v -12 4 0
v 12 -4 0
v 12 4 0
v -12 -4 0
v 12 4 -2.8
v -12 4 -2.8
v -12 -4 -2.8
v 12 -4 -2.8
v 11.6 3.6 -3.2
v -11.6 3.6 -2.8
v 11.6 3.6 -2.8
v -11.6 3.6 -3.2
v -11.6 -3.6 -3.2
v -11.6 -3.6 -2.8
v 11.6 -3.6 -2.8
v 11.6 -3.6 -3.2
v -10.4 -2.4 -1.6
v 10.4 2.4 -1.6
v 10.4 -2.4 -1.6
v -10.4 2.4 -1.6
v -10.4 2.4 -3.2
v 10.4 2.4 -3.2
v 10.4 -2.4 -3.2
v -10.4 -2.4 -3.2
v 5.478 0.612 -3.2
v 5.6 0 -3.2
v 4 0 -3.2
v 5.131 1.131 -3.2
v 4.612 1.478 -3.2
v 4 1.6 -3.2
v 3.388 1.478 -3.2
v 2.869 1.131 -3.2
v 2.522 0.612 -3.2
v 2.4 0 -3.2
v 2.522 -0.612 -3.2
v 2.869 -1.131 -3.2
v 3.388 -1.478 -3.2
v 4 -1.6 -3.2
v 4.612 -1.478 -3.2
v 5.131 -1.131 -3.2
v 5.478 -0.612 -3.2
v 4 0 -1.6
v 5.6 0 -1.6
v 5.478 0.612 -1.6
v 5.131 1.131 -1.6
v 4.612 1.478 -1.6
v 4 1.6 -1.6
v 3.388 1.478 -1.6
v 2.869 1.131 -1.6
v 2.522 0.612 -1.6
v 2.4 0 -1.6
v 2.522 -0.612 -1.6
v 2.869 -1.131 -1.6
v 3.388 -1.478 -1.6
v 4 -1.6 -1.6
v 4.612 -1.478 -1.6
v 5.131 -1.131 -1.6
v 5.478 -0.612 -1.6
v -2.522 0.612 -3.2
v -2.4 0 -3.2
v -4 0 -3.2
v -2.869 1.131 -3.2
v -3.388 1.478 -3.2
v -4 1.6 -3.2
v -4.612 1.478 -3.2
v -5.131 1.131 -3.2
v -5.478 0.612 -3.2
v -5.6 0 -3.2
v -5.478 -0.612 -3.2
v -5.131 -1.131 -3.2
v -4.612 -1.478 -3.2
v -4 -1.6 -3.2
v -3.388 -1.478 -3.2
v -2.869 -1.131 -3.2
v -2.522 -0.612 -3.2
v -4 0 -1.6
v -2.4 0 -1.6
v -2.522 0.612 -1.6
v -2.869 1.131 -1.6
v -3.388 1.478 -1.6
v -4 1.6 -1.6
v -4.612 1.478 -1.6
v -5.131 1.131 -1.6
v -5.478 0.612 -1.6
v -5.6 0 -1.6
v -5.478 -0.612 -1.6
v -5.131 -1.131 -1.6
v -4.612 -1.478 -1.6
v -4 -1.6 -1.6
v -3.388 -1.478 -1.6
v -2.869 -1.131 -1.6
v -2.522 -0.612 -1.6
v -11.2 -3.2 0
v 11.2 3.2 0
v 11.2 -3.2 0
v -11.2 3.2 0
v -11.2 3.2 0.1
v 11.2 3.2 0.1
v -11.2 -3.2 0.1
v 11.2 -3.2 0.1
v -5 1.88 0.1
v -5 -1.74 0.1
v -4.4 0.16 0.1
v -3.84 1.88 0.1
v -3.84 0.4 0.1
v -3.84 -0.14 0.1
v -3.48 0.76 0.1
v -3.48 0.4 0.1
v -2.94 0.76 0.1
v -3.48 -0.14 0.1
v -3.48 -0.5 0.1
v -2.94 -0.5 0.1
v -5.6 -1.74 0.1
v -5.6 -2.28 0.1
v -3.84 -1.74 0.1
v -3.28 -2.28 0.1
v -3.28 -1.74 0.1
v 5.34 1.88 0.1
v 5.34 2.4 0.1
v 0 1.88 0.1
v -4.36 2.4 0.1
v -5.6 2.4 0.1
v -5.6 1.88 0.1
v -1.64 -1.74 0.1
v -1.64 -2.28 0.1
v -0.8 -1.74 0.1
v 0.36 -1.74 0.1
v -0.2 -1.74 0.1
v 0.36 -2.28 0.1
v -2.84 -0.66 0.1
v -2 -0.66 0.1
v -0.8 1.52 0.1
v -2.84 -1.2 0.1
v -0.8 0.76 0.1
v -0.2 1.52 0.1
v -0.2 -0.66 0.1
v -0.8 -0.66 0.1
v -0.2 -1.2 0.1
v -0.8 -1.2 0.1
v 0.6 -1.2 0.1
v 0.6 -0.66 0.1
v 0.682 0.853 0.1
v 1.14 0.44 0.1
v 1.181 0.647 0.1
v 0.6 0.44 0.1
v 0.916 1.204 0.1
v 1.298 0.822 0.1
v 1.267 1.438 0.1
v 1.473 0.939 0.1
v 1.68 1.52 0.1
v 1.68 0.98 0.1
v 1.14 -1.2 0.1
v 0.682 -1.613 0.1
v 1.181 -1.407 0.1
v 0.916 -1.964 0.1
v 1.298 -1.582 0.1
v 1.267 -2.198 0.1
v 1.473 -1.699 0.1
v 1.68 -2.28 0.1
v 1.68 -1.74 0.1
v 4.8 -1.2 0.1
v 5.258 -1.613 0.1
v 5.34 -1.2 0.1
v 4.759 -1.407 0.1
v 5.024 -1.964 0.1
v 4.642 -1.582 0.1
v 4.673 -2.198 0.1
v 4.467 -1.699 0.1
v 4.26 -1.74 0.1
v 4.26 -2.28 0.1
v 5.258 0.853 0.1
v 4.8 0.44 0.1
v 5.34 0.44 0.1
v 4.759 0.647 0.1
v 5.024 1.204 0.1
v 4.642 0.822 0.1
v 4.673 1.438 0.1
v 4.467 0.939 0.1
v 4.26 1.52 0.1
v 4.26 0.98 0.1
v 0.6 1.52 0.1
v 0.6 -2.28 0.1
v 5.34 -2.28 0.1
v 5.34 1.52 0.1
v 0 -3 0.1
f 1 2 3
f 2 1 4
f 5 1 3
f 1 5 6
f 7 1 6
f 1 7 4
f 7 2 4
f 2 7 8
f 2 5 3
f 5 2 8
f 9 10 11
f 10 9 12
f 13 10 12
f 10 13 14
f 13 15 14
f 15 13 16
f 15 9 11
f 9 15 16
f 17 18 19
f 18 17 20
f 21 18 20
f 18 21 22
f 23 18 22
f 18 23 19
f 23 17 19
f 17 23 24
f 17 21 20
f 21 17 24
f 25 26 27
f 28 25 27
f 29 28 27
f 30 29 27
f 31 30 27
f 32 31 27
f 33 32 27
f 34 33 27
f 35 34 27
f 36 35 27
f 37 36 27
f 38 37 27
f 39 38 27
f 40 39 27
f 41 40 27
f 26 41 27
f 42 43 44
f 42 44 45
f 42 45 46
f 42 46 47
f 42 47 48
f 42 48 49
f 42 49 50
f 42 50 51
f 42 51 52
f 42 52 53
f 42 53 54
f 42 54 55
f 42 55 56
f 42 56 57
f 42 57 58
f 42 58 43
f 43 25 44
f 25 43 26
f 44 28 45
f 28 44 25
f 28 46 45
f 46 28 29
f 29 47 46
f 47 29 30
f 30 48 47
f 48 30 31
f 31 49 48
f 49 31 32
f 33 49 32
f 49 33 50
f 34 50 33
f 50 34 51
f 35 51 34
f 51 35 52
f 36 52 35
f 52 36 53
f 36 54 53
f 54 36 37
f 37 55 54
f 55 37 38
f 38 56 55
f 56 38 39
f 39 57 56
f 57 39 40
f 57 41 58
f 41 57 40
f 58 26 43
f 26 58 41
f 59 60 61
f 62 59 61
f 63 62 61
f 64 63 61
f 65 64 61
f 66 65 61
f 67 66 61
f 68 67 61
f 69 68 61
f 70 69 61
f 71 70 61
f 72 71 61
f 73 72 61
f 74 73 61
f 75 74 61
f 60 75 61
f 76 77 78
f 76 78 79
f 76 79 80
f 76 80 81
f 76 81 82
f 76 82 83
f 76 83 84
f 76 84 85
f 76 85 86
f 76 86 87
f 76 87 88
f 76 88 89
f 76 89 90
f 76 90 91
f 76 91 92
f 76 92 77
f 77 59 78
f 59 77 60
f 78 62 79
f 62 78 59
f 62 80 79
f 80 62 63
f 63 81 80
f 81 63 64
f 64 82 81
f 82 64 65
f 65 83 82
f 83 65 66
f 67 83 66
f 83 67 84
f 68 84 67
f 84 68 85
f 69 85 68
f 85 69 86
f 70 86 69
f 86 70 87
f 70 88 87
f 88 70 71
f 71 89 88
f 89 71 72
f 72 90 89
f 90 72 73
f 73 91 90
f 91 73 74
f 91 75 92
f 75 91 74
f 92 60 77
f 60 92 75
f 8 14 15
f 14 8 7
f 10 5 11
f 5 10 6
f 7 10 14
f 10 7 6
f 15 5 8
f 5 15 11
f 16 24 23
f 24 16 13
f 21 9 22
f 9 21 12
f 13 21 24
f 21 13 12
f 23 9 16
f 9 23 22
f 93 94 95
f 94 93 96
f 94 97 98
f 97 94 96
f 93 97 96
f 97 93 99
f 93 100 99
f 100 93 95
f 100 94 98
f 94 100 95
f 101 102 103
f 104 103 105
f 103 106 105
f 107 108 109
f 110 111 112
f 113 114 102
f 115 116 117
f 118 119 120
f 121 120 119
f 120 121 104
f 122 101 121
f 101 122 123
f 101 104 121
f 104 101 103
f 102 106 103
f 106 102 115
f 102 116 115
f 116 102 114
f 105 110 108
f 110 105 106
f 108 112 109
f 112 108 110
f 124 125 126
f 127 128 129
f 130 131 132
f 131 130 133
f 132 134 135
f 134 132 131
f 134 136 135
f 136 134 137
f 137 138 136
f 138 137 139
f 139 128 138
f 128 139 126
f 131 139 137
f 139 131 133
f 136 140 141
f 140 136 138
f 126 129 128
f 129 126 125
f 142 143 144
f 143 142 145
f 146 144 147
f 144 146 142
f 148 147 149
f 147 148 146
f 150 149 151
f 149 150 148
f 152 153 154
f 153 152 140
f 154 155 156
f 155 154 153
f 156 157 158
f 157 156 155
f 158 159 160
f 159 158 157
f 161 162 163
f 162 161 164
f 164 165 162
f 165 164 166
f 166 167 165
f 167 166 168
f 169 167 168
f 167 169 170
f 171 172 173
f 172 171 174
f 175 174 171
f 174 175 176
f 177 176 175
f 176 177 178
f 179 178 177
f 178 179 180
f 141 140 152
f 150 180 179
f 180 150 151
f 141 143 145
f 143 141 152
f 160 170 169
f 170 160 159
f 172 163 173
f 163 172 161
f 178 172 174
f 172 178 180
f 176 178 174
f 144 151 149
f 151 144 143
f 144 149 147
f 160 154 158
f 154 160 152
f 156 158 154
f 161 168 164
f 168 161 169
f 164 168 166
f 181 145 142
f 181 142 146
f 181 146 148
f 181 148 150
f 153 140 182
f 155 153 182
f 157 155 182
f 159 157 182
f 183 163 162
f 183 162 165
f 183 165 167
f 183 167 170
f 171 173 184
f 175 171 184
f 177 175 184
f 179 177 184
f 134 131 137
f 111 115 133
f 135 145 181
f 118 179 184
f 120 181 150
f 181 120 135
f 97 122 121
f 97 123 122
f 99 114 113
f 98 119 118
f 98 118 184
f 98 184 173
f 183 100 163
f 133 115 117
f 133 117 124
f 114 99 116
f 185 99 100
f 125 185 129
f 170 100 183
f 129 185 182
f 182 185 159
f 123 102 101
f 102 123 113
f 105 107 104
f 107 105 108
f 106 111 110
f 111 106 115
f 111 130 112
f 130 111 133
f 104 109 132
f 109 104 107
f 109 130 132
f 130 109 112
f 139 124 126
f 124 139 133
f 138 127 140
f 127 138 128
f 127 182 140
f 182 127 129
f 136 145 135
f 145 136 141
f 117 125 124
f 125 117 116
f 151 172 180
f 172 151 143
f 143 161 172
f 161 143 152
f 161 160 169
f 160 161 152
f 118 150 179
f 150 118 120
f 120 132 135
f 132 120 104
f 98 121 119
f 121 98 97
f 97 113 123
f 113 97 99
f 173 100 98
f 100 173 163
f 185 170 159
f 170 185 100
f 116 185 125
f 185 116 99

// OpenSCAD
// file: ../p/4-4edge.scad
use <../lib.scad>
function ldraw_lib__4_4edge() = [
// 0 Circle 1.0
// 0 Name: 4-4edge.dat
// 0 Author: James Jessiman
// 0 !LDRAW_ORG Primitive UPDATE 2017-01
// 0 !LICENSE Licensed under CC BY 2.0 and CC BY 4.0 : see CAreadme.txt
// 
// 0 BFC CERTIFY CCW
  [0,"BFC","CERTIFY"],
  [0,"BFC","CCW"],
// 
// 0 !HISTORY 1998-12-15 [PTadmin] Official Update 1998-10
// 0 !HISTORY 2005-12-28 [PTadmin] Official Update 2005-01
// 0 !HISTORY 2007-06-24 [PTadmin] Header formatted for Contributor Agreement
// 0 !HISTORY 2008-07-01 [PTadmin] Official Update 2008-01
// 0 !HISTORY 2017-01-15 [Steffen] BFCed
// 0 !HISTORY 2017-12-30 [PTadmin] Official Update 2017-01
// 
// 
// 2 24 1 0 0 0.9239 0 0.3827
  [2,24,1,0,0,0.9239,0,0.3827],
// 2 24 0.9239 0 0.3827 0.7071 0 0.7071
  [2,24,0.9239,0,0.3827,0.7071,0,0.7071],
// 2 24 0.7071 0 0.7071 0.3827 0 0.9239
  [2,24,0.7071,0,0.7071,0.3827,0,0.9239],
// 2 24 0.3827 0 0.9239 0 0 1
  [2,24,0.3827,0,0.9239,0,0,1],
// 2 24 0 0 1 -0.3827 0 0.9239
  [2,24,0,0,1,-0.3827,0,0.9239],
// 2 24 -0.3827 0 0.9239 -0.7071 0 0.7071
  [2,24,-0.3827,0,0.9239,-0.7071,0,0.7071],
// 2 24 -0.7071 0 0.7071 -0.9239 0 0.3827
  [2,24,-0.7071,0,0.7071,-0.9239,0,0.3827],
// 2 24 -0.9239 0 0.3827 -1 0 -0
  [2,24,-0.9239,0,0.3827,-1,0,-0],
// 2 24 -1 0 -0 -0.9239 0 -0.3827
  [2,24,-1,0,-0,-0.9239,0,-0.3827],
// 2 24 -0.9239 0 -0.3827 -0.7071 0 -0.7071
  [2,24,-0.9239,0,-0.3827,-0.7071,0,-0.7071],
// 2 24 -0.7071 0 -0.7071 -0.3827 0 -0.9239
  [2,24,-0.7071,0,-0.7071,-0.3827,0,-0.9239],
// 2 24 -0.3827 0 -0.9239 0 0 -1
  [2,24,-0.3827,0,-0.9239,0,0,-1],
// 2 24 0 0 -1 0.3827 0 -0.9239
  [2,24,0,0,-1,0.3827,0,-0.9239],
// 2 24 0.3827 0 -0.9239 0.7071 0 -0.7071
  [2,24,0.3827,0,-0.9239,0.7071,0,-0.7071],
// 2 24 0.7071 0 -0.7071 0.9239 0 -0.3827
  [2,24,0.7071,0,-0.7071,0.9239,0,-0.3827],
// 2 24 0.9239 0 -0.3827 1 0 0
  [2,24,0.9239,0,-0.3827,1,0,0],
];
module ldraw_lib__4_4edge(step=0, col=false, unit=2/5, alt=false, line=0.2, solid=!$preview)
    makepoly(ldraw_lib__4_4edge(), step=step, col=col, unit=unit, alt=alt, line=line, solid=solid);
ldraw_lib__4_4edge(line=0.2);
// file: ../p/4-4disc.scad
use <../lib.scad>
function ldraw_lib__4_4disc() = [
// 0 Disc 1.0
// 0 Name: 4-4disc.dat
// 0 Author: James Jessiman
// 0 !LDRAW_ORG Primitive UPDATE 2002-02
// 0 !LICENSE Licensed under CC BY 2.0 and CC BY 4.0 : see CAreadme.txt
// 
// 0 BFC CERTIFY CCW
  [0,"BFC","CERTIFY"],
  [0,"BFC","CCW"],
// 
// 0 !HISTORY 1998-12-15 [PTadmin] Official Update 1998-10
// 0 !HISTORY 2002-03-23 [sbliss] Added BFC statement
// 0 !HISTORY 2002-04-25 [PTadmin] Official Update 2002-02
// 0 !HISTORY 2007-06-24 [PTadmin] Header formatted for Contributor Agreement
// 0 !HISTORY 2008-07-01 [PTadmin] Official Update 2008-01
// 
// 
// 3 16 0 0 0 1 0 0 0.9239 0 0.3827
  [3,16,0,0,0,1,0,0,0.9239,0,0.3827],
// 3 16 0 0 0 0.9239 0 0.3827 0.7071 0 0.7071
  [3,16,0,0,0,0.9239,0,0.3827,0.7071,0,0.7071],
// 3 16 0 0 0 0.7071 0 0.7071 0.3827 0 0.9239
  [3,16,0,0,0,0.7071,0,0.7071,0.3827,0,0.9239],
// 3 16 0 0 0 0.3827 0 0.9239 0 0 1
  [3,16,0,0,0,0.3827,0,0.9239,0,0,1],
// 3 16 0 0 0 0 0 1 -0.3827 0 0.9239
  [3,16,0,0,0,0,0,1,-0.3827,0,0.9239],
// 3 16 0 0 0 -0.3827 0 0.9239 -0.7071 0 0.7071
  [3,16,0,0,0,-0.3827,0,0.9239,-0.7071,0,0.7071],
// 3 16 0 0 0 -0.7071 0 0.7071 -0.9239 0 0.3827
  [3,16,0,0,0,-0.7071,0,0.7071,-0.9239,0,0.3827],
// 3 16 0 0 0 -0.9239 0 0.3827 -1 0 -0
  [3,16,0,0,0,-0.9239,0,0.3827,-1,0,-0],
// 3 16 0 0 0 -1 0 -0 -0.9239 0 -0.3827
  [3,16,0,0,0,-1,0,-0,-0.9239,0,-0.3827],
// 3 16 0 0 0 -0.9239 0 -0.3827 -0.7071 0 -0.7071
  [3,16,0,0,0,-0.9239,0,-0.3827,-0.7071,0,-0.7071],
// 3 16 0 0 0 -0.7071 0 -0.7071 -0.3827 0 -0.9239
  [3,16,0,0,0,-0.7071,0,-0.7071,-0.3827,0,-0.9239],
// 3 16 0 0 0 -0.3827 0 -0.9239 0 0 -1
  [3,16,0,0,0,-0.3827,0,-0.9239,0,0,-1],
// 3 16 0 0 0 0 0 -1 0.3827 0 -0.9239
  [3,16,0,0,0,0,0,-1,0.3827,0,-0.9239],
// 3 16 0 0 0 0.3827 0 -0.9239 0.7071 0 -0.7071
  [3,16,0,0,0,0.3827,0,-0.9239,0.7071,0,-0.7071],
// 3 16 0 0 0 0.7071 0 -0.7071 0.9239 0 -0.3827
  [3,16,0,0,0,0.7071,0,-0.7071,0.9239,0,-0.3827],
// 3 16 0 0 0 0.9239 0 -0.3827 1 0 0
  [3,16,0,0,0,0.9239,0,-0.3827,1,0,0],
// 0
];
module ldraw_lib__4_4disc(step=0, col=false, unit=2/5, alt=false, line=0.2, solid=!$preview)
    makepoly(ldraw_lib__4_4disc(), step=step, col=col, unit=unit, alt=alt, line=line, solid=solid);
ldraw_lib__4_4disc(line=0.2);
// file: ../p/4-4cyli.scad
use <../lib.scad>
$fa=1; $fs=0.2;
function ldraw_lib__4_4cyli(realsolid=false) = [
// 0 Cylinder 1.0
// 0 Name: 4-4cyli.dat
// 0 Author: James Jessiman
// 0 !LDRAW_ORG Primitive UPDATE 2005-01
// 0 !LICENSE Licensed under CC BY 2.0 and CC BY 4.0 : see CAreadme.txt
// 
// 0 BFC CERTIFY CCW
  [0,"BFC","CERTIFY"],
  [0,"BFC","CCW"],
// 
// 0 !HISTORY 1998-12-15 [PTadmin] Official Update 1998-10
// 0 !HISTORY 2002-03-23 [sbliss] Added BFC statement; merged headers from files in distributions LDraw 0.27 and Complete.
// 0 !HISTORY 2002-04-25 [PTadmin] Official Update 2002-02
// 0 !HISTORY 2004-12-14 [guyvivan] BFC CCW
// 0 !HISTORY 2005-12-28 [PTadmin] Official Update 2005-01
// 0 !HISTORY 2007-06-24 [PTadmin] Header formatted for Contributor Agreement
// 0 !HISTORY 2008-07-01 [PTadmin] Official Update 2008-01
// 
// 
// 4 16 1 1 0 0.9239 1 0.3827 0.9239 0 0.3827 1 0 0
  [4,16,1,1,0,0.9239,1,0.3827,0.9239,0,0.3827,1,0,0],
// 5 24 1 0 0 1 1 0 0.9239 0 0.3827 0.9239 0 -0.3827
  [5,24,1,0,0,1,1,0,0.9239,0,0.3827,0.9239,0,-0.3827],
// 4 16 0.9239 1 0.3827 0.7071 1 0.7071 0.7071 0 0.7071 0.9239 0 0.3827
  [4,16,0.9239,1,0.3827,0.7071,1,0.7071,0.7071,0,0.7071,0.9239,0,0.3827],
// 5 24 0.9239 0 0.3827 0.9239 1 0.3827 0.7071 0 0.7071 1 0 0
  [5,24,0.9239,0,0.3827,0.9239,1,0.3827,0.7071,0,0.7071,1,0,0],
// 4 16 0.7071 1 0.7071 0.3827 1 0.9239 0.3827 0 0.9239 0.7071 0 0.7071
  [4,16,0.7071,1,0.7071,0.3827,1,0.9239,0.3827,0,0.9239,0.7071,0,0.7071],
// 5 24 0.7071 0 0.7071 0.7071 1 0.7071 0.3827 0 0.9239 0.9239 0 0.3827
  [5,24,0.7071,0,0.7071,0.7071,1,0.7071,0.3827,0,0.9239,0.9239,0,0.3827],
// 4 16 0.3827 1 0.9239 0 1 1 0 0 1 0.3827 0 0.9239
  [4,16,0.3827,1,0.9239,0,1,1,0,0,1,0.3827,0,0.9239],
// 5 24 0.3827 0 0.9239 0.3827 1 0.9239 0 0 1 0.7071 0 0.7071
  [5,24,0.3827,0,0.9239,0.3827,1,0.9239,0,0,1,0.7071,0,0.7071],
// 4 16 0 1 1 -0.3827 1 0.9239 -0.3827 0 0.9239 0 0 1
  [4,16,0,1,1,-0.3827,1,0.9239,-0.3827,0,0.9239,0,0,1],
// 5 24 0 0 1 0 1 1 -0.3827 0 0.9239 0.3827 0 0.9239
  [5,24,0,0,1,0,1,1,-0.3827,0,0.9239,0.3827,0,0.9239],
// 4 16 -0.3827 1 0.9239 -0.7071 1 0.7071 -0.7071 0 0.7071 -0.3827 0 0.9239
  [4,16,-0.3827,1,0.9239,-0.7071,1,0.7071,-0.7071,0,0.7071,-0.3827,0,0.9239],
// 5 24 -0.3827 0 0.9239 -0.3827 1 0.9239 -0.7071 0 0.7071 0 0 1
  [5,24,-0.3827,0,0.9239,-0.3827,1,0.9239,-0.7071,0,0.7071,0,0,1],
// 4 16 -0.7071 1 0.7071 -0.9239 1 0.3827 -0.9239 0 0.3827 -0.7071 0 0.7071
  [4,16,-0.7071,1,0.7071,-0.9239,1,0.3827,-0.9239,0,0.3827,-0.7071,0,0.7071],
// 5 24 -0.7071 0 0.7071 -0.7071 1 0.7071 -0.9239 0 0.3827 -0.3827 0 0.9239
  [5,24,-0.7071,0,0.7071,-0.7071,1,0.7071,-0.9239,0,0.3827,-0.3827,0,0.9239],
// 4 16 -0.9239 1 0.3827 -1 1 0 -1 0 0 -0.9239 0 0.3827
  [4,16,-0.9239,1,0.3827,-1,1,0,-1,0,0,-0.9239,0,0.3827],
// 5 24 -0.9239 0 0.3827 -0.9239 1 0.3827 -1 0 0 -0.7071 0 0.7071
  [5,24,-0.9239,0,0.3827,-0.9239,1,0.3827,-1,0,0,-0.7071,0,0.7071],
// 4 16 -1 1 0 -0.9239 1 -0.3827 -0.9239 0 -0.3827 -1 0 0
  [4,16,-1,1,0,-0.9239,1,-0.3827,-0.9239,0,-0.3827,-1,0,0],
// 5 24 -1 0 0 -1 1 0 -0.9239 0 -0.3827 -0.9239 0 0.3827
  [5,24,-1,0,0,-1,1,0,-0.9239,0,-0.3827,-0.9239,0,0.3827],
// 4 16 -0.9239 1 -0.3827 -0.7071 1 -0.7071 -0.7071 0 -0.7071 -0.9239 0 -0.3827
  [4,16,-0.9239,1,-0.3827,-0.7071,1,-0.7071,-0.7071,0,-0.7071,-0.9239,0,-0.3827],
// 5 24 -0.9239 0 -0.3827 -0.9239 1 -0.3827 -0.7071 0 -0.7071 -1 0 0
  [5,24,-0.9239,0,-0.3827,-0.9239,1,-0.3827,-0.7071,0,-0.7071,-1,0,0],
// 4 16 -0.7071 1 -0.7071 -0.3827 1 -0.9239 -0.3827 0 -0.9239 -0.7071 0 -0.7071
  [4,16,-0.7071,1,-0.7071,-0.3827,1,-0.9239,-0.3827,0,-0.9239,-0.7071,0,-0.7071],
// 5 24 -0.7071 0 -0.7071 -0.7071 1 -0.7071 -0.3827 0 -0.9239 -0.9239 0 -0.3827
  [5,24,-0.7071,0,-0.7071,-0.7071,1,-0.7071,-0.3827,0,-0.9239,-0.9239,0,-0.3827],
// 4 16 -0.3827 1 -0.9239 0 1 -1 0 0 -1 -0.3827 0 -0.9239
  [4,16,-0.3827,1,-0.9239,0,1,-1,0,0,-1,-0.3827,0,-0.9239],
// 5 24 -0.3827 0 -0.9239 -0.3827 1 -0.9239 0 0 -1 -0.7071 0 -0.7071
  [5,24,-0.3827,0,-0.9239,-0.3827,1,-0.9239,0,0,-1,-0.7071,0,-0.7071],
// 4 16 0 1 -1 0.3827 1 -0.9239 0.3827 0 -0.9239 0 0 -1
  [4,16,0,1,-1,0.3827,1,-0.9239,0.3827,0,-0.9239,0,0,-1],
// 5 24 0 0 -1 0 1 -1 0.3827 0 -0.9239 -0.3827 0 -0.9239
  [5,24,0,0,-1,0,1,-1,0.3827,0,-0.9239,-0.3827,0,-0.9239],
// 4 16 0.3827 1 -0.9239 0.7071 1 -0.7071 0.7071 0 -0.7071 0.3827 0 -0.9239
  [4,16,0.3827,1,-0.9239,0.7071,1,-0.7071,0.7071,0,-0.7071,0.3827,0,-0.9239],
// 5 24 0.3827 0 -0.9239 0.3827 1 -0.9239 0.7071 0 -0.7071 0 0 -1
  [5,24,0.3827,0,-0.9239,0.3827,1,-0.9239,0.7071,0,-0.7071,0,0,-1],
// 4 16 0.7071 1 -0.7071 0.9239 1 -0.3827 0.9239 0 -0.3827 0.7071 0 -0.7071
  [4,16,0.7071,1,-0.7071,0.9239,1,-0.3827,0.9239,0,-0.3827,0.7071,0,-0.7071],
// 5 24 0.7071 0 -0.7071 0.7071 1 -0.7071 0.9239 0 -0.3827 0.3827 0 -0.9239
  [5,24,0.7071,0,-0.7071,0.7071,1,-0.7071,0.9239,0,-0.3827,0.3827,0,-0.9239],
// 4 16 0.9239 1 -0.3827 1 1 0 1 0 0 0.9239 0 -0.3827
  [4,16,0.9239,1,-0.3827,1,1,0,1,0,0,0.9239,0,-0.3827],
// 5 24 0.9239 0 -0.3827 0.9239 1 -0.3827 1 0 0 0.7071 0 -0.7071
  [5,24,0.9239,0,-0.3827,0.9239,1,-0.3827,1,0,0,0.7071,0,-0.7071],
// 0
];
module ldraw_lib__4_4cyli(step=0, col=false, unit=2/5, alt=false, line=0.2, solid=!$preview)
    makepoly(ldraw_lib__4_4cyli(solid), step=step, col=col, unit=unit, alt=alt, line=line, solid=solid);
ldraw_lib__4_4cyli(line=0.2);
// file: ../p/stud3.scad
use <../lib.scad>
use <4-4cyli.scad>
use <4-4disc.scad>
use <4-4edge.scad>
function ldraw_lib__stud3() = [
// 0 Stud Tube Solid
// 0 Name: stud3.dat
// 0 Author: James Jessiman
// 0 !LDRAW_ORG Primitive UPDATE 2012-01
// 0 !LICENSE Licensed under CC BY 4.0 : see CAreadme.txt
// 
// 0 BFC CERTIFY CCW
  [0,"BFC","CERTIFY"],
  [0,"BFC","CCW"],
// 
// 0 !HISTORY 2002-04-04 [sbliss] Modified for BFC compliance
// 0 !HISTORY 2002-04-25 [PTadmin] Official Update 2002-02
// 0 !HISTORY 2007-06-24 [PTadmin] Header formatted for Contributor Agreement
// 0 !HISTORY 2008-07-01 [PTadmin] Official Update 2008-01
// 0 !HISTORY 2012-02-16 [Philo] Changed to CCW
// 0 !HISTORY 2012-03-30 [PTadmin] Official Update 2012-01
// 
// 
// 1 16 0 -4 0 4 0 0 0 1 0 0 0 4 4-4edge.dat
  [1,16,0,-4,0,4,0,0,0,1,0,0,0,4, ldraw_lib__4_4edge()],
// 1 16 0 0 0 4 0 0 0 1 0 0 0 4 4-4edge.dat
  [1,16,0,0,0,4,0,0,0,1,0,0,0,4, ldraw_lib__4_4edge()],
// 1 16 0 -4 0 4 0 0 0 1 0 0 0 4 4-4disc.dat
  [1,16,0,-4,0,4,0,0,0,1,0,0,0,4, ldraw_lib__4_4disc()],
  [-1,16,0,0,0,4,0,0,0,-1,0,0,0,4, ldraw_lib__4_4disc()],
// 1 16 0 -4 0 4 0 0 0 4 0 0 0 4 4-4cyli.dat
  [1,16,0,-4,0,4,0,0,0,4,0,0,0,4, ldraw_lib__4_4cyli()],
];
module ldraw_lib__stud3(step=0, col=false, unit=2/5, alt=false, line=0.2, solid=!$preview)
    makepoly(ldraw_lib__stud3(), step=step, col=col, unit=unit, alt=alt, line=line, solid=solid);
ldraw_lib__stud3(line=0.2);
// file: ../p/box5.scad
use <../lib.scad>
function ldraw_lib__box5() = [
// 0 Box with 5 Faces and All Edges
// 0 Name: box5.dat
// 0 Author: James Jessiman
// 0 !LDRAW_ORG Primitive UPDATE 2012-01
// 0 !LICENSE Licensed under CC BY 2.0 and CC BY 4.0 : see CAreadme.txt
// 
// 0 BFC CERTIFY CCW
  [0,"BFC","CERTIFY"],
  [0,"BFC","CCW"],
// 
// 0 !HISTORY 2002-04-03 [sbliss] Modified for BFC compliance
// 0 !HISTORY 2002-04-25 [PTadmin] Official Update 2002-02
// 0 !HISTORY 2007-06-24 [PTadmin] Header formatted for Contributor Agreement
// 0 !HISTORY 2008-07-01 [PTadmin] Official Update 2008-01
// 0 !HISTORY 2012-02-16 [Philo] Changed to CCW
// 0 !HISTORY 2012-03-30 [PTadmin] Official Update 2012-01
// 
// 
// 2 24 1 1 1 -1 1 1
  [2,24,1,1,1,-1,1,1],
// 2 24 -1 1 1 -1 1 -1
  [2,24,-1,1,1,-1,1,-1],
// 2 24 -1 1 -1 1 1 -1
  [2,24,-1,1,-1,1,1,-1],
// 2 24 1 1 -1 1 1 1
  [2,24,1,1,-1,1,1,1],
// 2 24 1 0 1 -1 0 1
  [2,24,1,0,1,-1,0,1],
// 2 24 -1 0 1 -1 0 -1
  [2,24,-1,0,1,-1,0,-1],
// 2 24 -1 0 -1 1 0 -1
  [2,24,-1,0,-1,1,0,-1],
// 2 24 1 0 -1 1 0 1
  [2,24,1,0,-1,1,0,1],
// 2 24 1 0 1 1 1 1
  [2,24,1,0,1,1,1,1],
// 2 24 -1 0 1 -1 1 1
  [2,24,-1,0,1,-1,1,1],
// 2 24 1 0 -1 1 1 -1
  [2,24,1,0,-1,1,1,-1],
// 2 24 -1 0 -1 -1 1 -1
  [2,24,-1,0,-1,-1,1,-1],
// 4 16 -1 1 1 1 1 1 1 1 -1 -1 1 -1
  [4,16,-1,1,1,1,1,1,1,1,-1,-1,1,-1],
// 4 16 -1 1 1 -1 0 1 1 0 1 1 1 1
  [4,16,-1,1,1,-1,0,1,1,0,1,1,1,1],
// 4 16 -1 1 -1 -1 0 -1 -1 0 1 -1 1 1
  [4,16,-1,1,-1,-1,0,-1,-1,0,1,-1,1,1],
// 4 16 1 1 -1 1 0 -1 -1 0 -1 -1 1 -1
  [4,16,1,1,-1,1,0,-1,-1,0,-1,-1,1,-1],
// 4 16 1 1 1 1 0 1 1 0 -1 1 1 -1
  [4,16,1,1,1,1,0,1,1,0,-1,1,1,-1],
];
makepoly(ldraw_lib__box5(), line=0.2);
// file: ../p/box4.scad
use <../lib.scad>
function ldraw_lib__box4() = [
// 0 Box with 4 Faces (2 Parallel Pairs) and All Edges
// 0 Name: box4.dat
// 0 Author: James Jessiman
// 0 !LDRAW_ORG Primitive UPDATE 2012-01
// 0 !LICENSE Licensed under CC BY 4.0 : see CAreadme.txt
// 
// 0 BFC CERTIFY CCW
  [0,"BFC","CERTIFY"],
  [0,"BFC","CCW"],
// 
// 0 !HISTORY 2002-04-03 [sbliss] Modified for BFC compliance
// 0 !HISTORY 2002-04-25 [PTadmin] Official Update 2002-02
// 0 !HISTORY 2007-06-24 [PTadmin] Header formatted for Contributor Agreement
// 0 !HISTORY 2008-07-01 [PTadmin] Official Update 2008-01
// 0 !HISTORY 2012-02-16 [Philo] Changed to CCW
// 0 !HISTORY 2012-03-30 [PTadmin] Official Update 2012-01
// 
// 
// 2 24 1 1 1 -1 1 1
  [2,24,1,1,1,-1,1,1],
// 2 24 -1 1 1 -1 1 -1
  [2,24,-1,1,1,-1,1,-1],
// 2 24 -1 1 -1 1 1 -1
  [2,24,-1,1,-1,1,1,-1],
// 2 24 1 1 -1 1 1 1
  [2,24,1,1,-1,1,1,1],
// 2 24 1 0 1 -1 0 1
  [2,24,1,0,1,-1,0,1],
// 2 24 -1 0 1 -1 0 -1
  [2,24,-1,0,1,-1,0,-1],
// 2 24 -1 0 -1 1 0 -1
  [2,24,-1,0,-1,1,0,-1],
// 2 24 1 0 -1 1 0 1
  [2,24,1,0,-1,1,0,1],
// 2 24 1 0 1 1 1 1
  [2,24,1,0,1,1,1,1],
// 2 24 -1 0 1 -1 1 1
  [2,24,-1,0,1,-1,1,1],
// 2 24 1 0 -1 1 1 -1
  [2,24,1,0,-1,1,1,-1],
// 2 24 -1 0 -1 -1 1 -1
  [2,24,-1,0,-1,-1,1,-1],
// 4 16 -1 1 1 -1 0 1 1 0 1 1 1 1
  [4,16,-1,1,1,-1,0,1,1,0,1,1,1,1],
// 4 16 -1 1 -1 -1 0 -1 -1 0 1 -1 1 1
  [4,16,-1,1,-1,-1,0,-1,-1,0,1,-1,1,1],
// 4 16 1 1 -1 1 0 -1 -1 0 -1 -1 1 -1
  [4,16,1,1,-1,1,0,-1,-1,0,-1,-1,1,-1],
// 4 16 1 1 1 1 0 1 1 0 -1 1 1 -1
  [4,16,1,1,1,1,0,1,1,0,-1,1,1,-1],
];
module ldraw_lib__box4(step=0, col=false, unit=2/5, alt=false, line=0.2, solid=!$preview)
    makepoly(ldraw_lib__box4(), step=step, col=col, unit=unit, alt=alt, line=line, solid=solid);
ldraw_lib__box4(line=0.2);
// file: s/63864s01.scad
use <../../lib.scad>
use <../../p/box4.scad>
use <../../p/box5.scad>
use <../../p/stud3.scad>
function ldraw_lib__s__63864s01() = [
// 0 ~Tile  1 x  3 without Top Face
// 0 Name: s\63864s01.dat
// 0 Author: Ulrich Röder [UR]
// 0 !LDRAW_ORG Subpart UPDATE 2019-01
// 0 !LICENSE Licensed under CC BY 4.0 : see CAreadme.txt
// 
// 0 BFC CERTIFY CCW
  [0,"BFC","CERTIFY"],
  [0,"BFC","CCW"],
// 
// 0 !HISTORY 2019-06-28 [PTadmin] Official Update 2019-01
// 
// 
// 1 16 0 0 0 30 0 0 0 7 0 0 0 10 box4.dat
  [1,16,0,0,0,30,0,0,0,7,0,0,0,10, ldraw_lib__box4()],
// 1 16 0 7 0 29 0 0 0 1 0 0 0 9 box4.dat
  [1,16,0,7,0,29,0,0,0,1,0,0,0,9, ldraw_lib__box4()],
// 0 BFC INVERTNEXT
  [0,"BFC","INVERTNEXT"],
// 1 16 0 8 0 -26 0 0 0 -4 0 0 0 6 box5.dat
  [1,16,0,8,0,-26,0,0,0,-4,0,0,0,6, ldraw_lib__box5()],
// 1 16 10 4 0 1 0 0 0 -1 0 0 0 1 stud3.dat
  [1,16,10,4,0,1,0,0,0,-1,0,0,0,1, ldraw_lib__stud3()],
// 1 16 -10 4 0 1 0 0 0 -1 0 0 0 1 stud3.dat
  [1,16,-10,4,0,1,0,0,0,-1,0,0,0,1, ldraw_lib__stud3()],
// 4 16 -30 7 -10 -29 7 -9 29 7 -9 30 7 -10
  [4,16,-30,7,-10,-29,7,-9,29,7,-9,30,7,-10],
// 4 16 30 7 10 29 7 9 -29 7 9 -30 7 10
  [4,16,30,7,10,29,7,9,-29,7,9,-30,7,10],
// 4 16 -30 7 -10 -30 7 10 -29 7 9 -29 7 -9
  [4,16,-30,7,-10,-30,7,10,-29,7,9,-29,7,-9],
// 4 16 30 7 10 30 7 -10 29 7 -9 29 7 9
  [4,16,30,7,10,30,7,-10,29,7,-9,29,7,9],
// 4 16 -29 8 -9 -26 8 -6 26 8 -6 29 8 -9
  [4,16,-29,8,-9,-26,8,-6,26,8,-6,29,8,-9],
// 4 16 29 8 9 26 8 6 -26 8 6 -29 8 9
  [4,16,29,8,9,26,8,6,-26,8,6,-29,8,9],
// 4 16 -29 8 -9 -29 8 9 -26 8 6 -26 8 -6
  [4,16,-29,8,-9,-29,8,9,-26,8,6,-26,8,-6],
// 4 16 29 8 9 29 8 -9 26 8 -6 26 8 6
  [4,16,29,8,9,29,8,-9,26,8,-6,26,8,6],
];
module ldraw_lib__s__63864s01(step=0, col=false, unit=2/5, alt=false, line=0.2, solid=!$preview)
    makepoly(ldraw_lib__s__63864s01(), step=step, col=col, unit=unit, alt=alt, line=line, solid=solid);
ldraw_lib__s__63864s01(line=0.2);
// file: ../p/box5-12.scad
use <../lib.scad>
function ldraw_lib__box5_12() = [
// 0 Box with 5 Faces without Any Edges
// 0 Name: box5-12.dat
// 0 Author: Chris Dee [cwdee]
// 0 !LDRAW_ORG Primitive UPDATE 2009-02
// 0 !LICENSE Licensed under CC BY 2.0 and CC BY 4.0 : see CAreadme.txt
// 
// 0 BFC CERTIFY CCW
  [0,"BFC","CERTIFY"],
  [0,"BFC","CCW"],
// 
// 0 !HISTORY 2009-09-03 [PTadmin] Official Update 2009-02
// 
// 
// 4 16 1 1 1 1 1 -1 -1 1 -1 -1 1 1
  [4,16,1,1,1,1,1,-1,-1,1,-1,-1,1,1],
// 4 16 -1 0 1 1 0 1 1 1 1 -1 1 1
  [4,16,-1,0,1,1,0,1,1,1,1,-1,1,1],
// 4 16 -1 0 -1 -1 0 1 -1 1 1 -1 1 -1
  [4,16,-1,0,-1,-1,0,1,-1,1,1,-1,1,-1],
// 4 16 1 0 -1 -1 0 -1 -1 1 -1 1 1 -1
  [4,16,1,0,-1,-1,0,-1,-1,1,-1,1,1,-1],
// 4 16 1 0 1 1 0 -1 1 1 -1 1 1 1
  [4,16,1,0,1,1,0,-1,1,1,-1,1,1,1],
// 0
];
module ldraw_lib__box5_12(step=0, col=false, unit=2/5, alt=false, line=0.2, solid=!$preview)
    makepoly(ldraw_lib__box5_12(), step=step, col=col, unit=unit, alt=alt, line=line, solid=solid);
ldraw_lib__box5_12(line=0.2);
// file: ../p/1-4ring1.scad
use <../lib.scad>
function ldraw_lib__1_4ring1() = [
// 0 Ring  1 x 0.25
// 0 Name: 1-4ring1.dat
// 0 Author: Chris Dee [cwdee]
// 0 !LDRAW_ORG Primitive UPDATE 2012-01
// 0 !LICENSE Licensed under CC BY 2.0 and CC BY 4.0 : see CAreadme.txt
// 
// 0 BFC CERTIFY CCW
  [0,"BFC","CERTIFY"],
  [0,"BFC","CCW"],
// 
// 0 !HISTORY 2000-05-07 [PTadmin] Official Update 2000-01
// 0 !HISTORY 2002-11-22 [hafhead] Added BFC statement
// 0 !HISTORY 2002-11-30 [PTadmin] Official Update 2002-05
// 0 !HISTORY 2007-06-22 [PTadmin] Header formatted for Contributor Agreement
// 0 !HISTORY 2008-07-01 [PTadmin] Official Update 2008-01
// 0 !HISTORY 2012-02-16 [Philo] Changed to CCW
// 0 !HISTORY 2012-03-30 [PTadmin] Official Update 2012-01
// 
// 
// 4 16 2 0 0 1.8478 0 0.7654 0.9239 0 0.3827 1 0 0
  [4,16,2,0,0,1.8478,0,0.7654,0.9239,0,0.3827,1,0,0],
// 4 16 1.8478 0 0.7654 1.4142 0 1.4142 0.7071 0 0.7071 0.9239 0 0.3827
  [4,16,1.8478,0,0.7654,1.4142,0,1.4142,0.7071,0,0.7071,0.9239,0,0.3827],
// 4 16 1.4142 0 1.4142 0.7654 0 1.8478 0.3827 0 0.9239 0.7071 0 0.7071
  [4,16,1.4142,0,1.4142,0.7654,0,1.8478,0.3827,0,0.9239,0.7071,0,0.7071],
// 4 16 0.7654 0 1.8478 0 0 2 0 0 1 0.3827 0 0.9239
  [4,16,0.7654,0,1.8478,0,0,2,0,0,1,0.3827,0,0.9239],
];
module ldraw_lib__1_4ring1(step=0, col=false, unit=2/5, alt=false, line=0.2, solid=!$preview)
    makepoly(ldraw_lib__1_4ring1(), step=step, col=col, unit=unit, alt=alt, line=line, solid=solid);
ldraw_lib__1_4ring1(line=0.2);
// file: ../p/1-4ndis.scad
use <../lib.scad>
function ldraw_lib__1_4ndis() = [
// 0 Disc Negative 0.25
// 0 Name: 1-4ndis.dat
// 0 Author: James Jessiman
// 0 !LDRAW_ORG Primitive UPDATE 2012-01
// 0 !LICENSE Licensed under CC BY 2.0 and CC BY 4.0 : see CAreadme.txt
// 
// 0 BFC CERTIFY CCW
  [0,"BFC","CERTIFY"],
  [0,"BFC","CCW"],
// 
// 0 !HISTORY 2002-03-23 [sbliss] Added BFC Statement
// 0 !HISTORY 2002-04-25 [PTadmin] Official Update 2002-02
// 0 !HISTORY 2007-06-22 [PTadmin] Header formatted for Contributor Agreement
// 0 !HISTORY 2008-07-01 [PTadmin] Official Update 2008-01
// 0 !HISTORY 2012-02-16 [Philo] Changed to CCW
// 0 !HISTORY 2012-03-30 [PTadmin] Official Update 2012-01
// 
// 
// 3 16 0.9239 0 0.3827 1 0 0 1 0 1
  [3,16,0.9239,0,0.3827,1,0,0,1,0,1],
// 3 16 0.7071 0 0.7071 0.9239 0 0.3827 1 0 1
  [3,16,0.7071,0,0.7071,0.9239,0,0.3827,1,0,1],
// 3 16 0.3827 0 0.9239 0.7071 0 0.7071 1 0 1
  [3,16,0.3827,0,0.9239,0.7071,0,0.7071,1,0,1],
// 3 16 0 0 1 0.3827 0 0.9239 1 0 1
  [3,16,0,0,1,0.3827,0,0.9239,1,0,1],
];
module ldraw_lib__1_4ndis(step=0, col=false, unit=2/5, alt=false, line=0.2, solid=!$preview)
    makepoly(ldraw_lib__1_4ndis(), step=step, col=col, unit=unit, alt=alt, line=line, solid=solid);
ldraw_lib__1_4ndis(line=0.2);
// file: ../p/1-4chrd.scad
use <../lib.scad>
$fa=1; $fs=0.2;
function ldraw_lib__1_4chrd(realsolid=false) = [
// 0 Chord 0.25
// 0 Name: 1-4chrd.dat
// 0 Author: Tony Hafner [hafhead]
// 0 !LDRAW_ORG Primitive UPDATE 2012-02
// 0 !LICENSE Licensed under CC BY 2.0 and CC BY 4.0 : see CAreadme.txt
// 
// 0 BFC CERTIFY CCW
  [0,"BFC","CERTIFY"],
  [0,"BFC","CCW"],
// 
// 0 !HISTORY 2004-04-22 [PTadmin] Official Update 2004-02
// 0 !HISTORY 2007-10-09 [PTadmin] Header formatted for Contributor Agreement
// 0 !HISTORY 2008-07-01 [PTadmin] Official Update 2008-01
// 0 !HISTORY 2012-08-02 [MMR1988] Re-creation with PrimGen2 and Rectifier
// 0 !HISTORY 2012-08-09 [PTadmin] Official Update 2012-02
// 
// 
// 4 16 0.9239 0 0.3827 0.3827 0 0.9239 0 0 1 1 0 0
  [4,16,0.9239,0,0.3827,0.3827,0,0.9239,0,0,1,1,0,0],
// 3 16 0.7071 0 0.7071 0.3827 0 0.9239 0.9239 0 0.3827
  [3,16,0.7071,0,0.7071,0.3827,0,0.9239,0.9239,0,0.3827],
];
module ldraw_lib__1_4chrd(step=0, col=false, unit=2/5, alt=false, line=0.2, solid=!$preview)
    makepoly(ldraw_lib__1_4chrd(solid), step=step, col=col, unit=unit, alt=alt, line=line, solid=solid);
ldraw_lib__1_4chrd(line=0.2);
// file: 63864.scad
use <../lib.scad>
use <s/63864s01.scad>
function ldraw_lib__63864() = [
// 0 Tile  1 x  3
// 0 Name: 63864.dat
// 0 Author: Tim Gould [timgould]
// 0 !LDRAW_ORG Part UPDATE 2019-01
// 0 !LICENSE Licensed under CC BY 2.0 and CC BY 4.0 : see CAreadme.txt
// 
// 0 BFC CERTIFY CCW
  [0,"BFC","CERTIFY"],
  [0,"BFC","CCW"],
// 
// 0 !HISTORY 2010-04-05 [PTadmin] Official Update 2010-01
// 0 !HISTORY 2019-06-28 [PTadmin] Official Update 2019-01
// 0 !HISTORY 2019-07-03 [UR] Subpart Integration
// 
// 
// 4 16 -30 0 -10 30 0 -10 30 0 10 -30 0 10
  [4,16,-30,0,-10,30,0,-10,30,0,10,-30,0,10],
// 1 16 0 0 0 1 0 0 0 1 0 0 0 1 s\63864s01.dat
  [1,16,0,0,0,1,0,0,0,1,0,0,0,1, ldraw_lib__s__63864s01()],
];
makepoly(ldraw_lib__63864(), line=0.2);
// main file
use <../lib.scad>
use <6112596e.scad>
use <63864.scad>
function ldraw_lib__63864df4() = [
// 0 Tile  1 x  3 with Groove  with "F40" on Yellow Background Sticker
// 0 Name: 63864df4.dat
// 0 Author: Alfred Schmitz [AlfredS]
// 0 !LDRAW_ORG Shortcut UPDATE 2026-08
// 0 !LICENSE Licensed under CC BY 4.0 : see CAreadme.txt
// 
// 0 BFC CERTIFY CCW
  [0,"BFC","CERTIFY"],
  [0,"BFC","CCW"],
// 
// 0 !CATEGORY Sticker Shortcut
// 0 !KEYWORDS F40, Ferrari, Icons, set 10248
// 
// 0 !HISTORY 2026-08-31 [OrionP] Official Update 2026-08
// 
// 1 16 0 0 0 1 0 0 0 1 0 0 0 1 63864.dat
  [1,16,0,0,0,1,0,0,0,1,0,0,0,1, ldraw_lib__63864()],
// 1 16 0 0 0 1 0 0 0 1 0 0 0 1 6112596e.dat
  [1,16,0,0,0,1,0,0,0,1,0,0,0,1, ldraw_lib__6112596e()],
];
module ldraw_lib__63864df4(step=0, col=false, unit=2/5, alt=false, line=0.2, solid=!$preview)
    makepoly(ldraw_lib__63864df4(), step=step, col=col, unit=unit, alt=alt, line=line, solid=solid);
ldraw_lib__63864df4(line=0.2);
